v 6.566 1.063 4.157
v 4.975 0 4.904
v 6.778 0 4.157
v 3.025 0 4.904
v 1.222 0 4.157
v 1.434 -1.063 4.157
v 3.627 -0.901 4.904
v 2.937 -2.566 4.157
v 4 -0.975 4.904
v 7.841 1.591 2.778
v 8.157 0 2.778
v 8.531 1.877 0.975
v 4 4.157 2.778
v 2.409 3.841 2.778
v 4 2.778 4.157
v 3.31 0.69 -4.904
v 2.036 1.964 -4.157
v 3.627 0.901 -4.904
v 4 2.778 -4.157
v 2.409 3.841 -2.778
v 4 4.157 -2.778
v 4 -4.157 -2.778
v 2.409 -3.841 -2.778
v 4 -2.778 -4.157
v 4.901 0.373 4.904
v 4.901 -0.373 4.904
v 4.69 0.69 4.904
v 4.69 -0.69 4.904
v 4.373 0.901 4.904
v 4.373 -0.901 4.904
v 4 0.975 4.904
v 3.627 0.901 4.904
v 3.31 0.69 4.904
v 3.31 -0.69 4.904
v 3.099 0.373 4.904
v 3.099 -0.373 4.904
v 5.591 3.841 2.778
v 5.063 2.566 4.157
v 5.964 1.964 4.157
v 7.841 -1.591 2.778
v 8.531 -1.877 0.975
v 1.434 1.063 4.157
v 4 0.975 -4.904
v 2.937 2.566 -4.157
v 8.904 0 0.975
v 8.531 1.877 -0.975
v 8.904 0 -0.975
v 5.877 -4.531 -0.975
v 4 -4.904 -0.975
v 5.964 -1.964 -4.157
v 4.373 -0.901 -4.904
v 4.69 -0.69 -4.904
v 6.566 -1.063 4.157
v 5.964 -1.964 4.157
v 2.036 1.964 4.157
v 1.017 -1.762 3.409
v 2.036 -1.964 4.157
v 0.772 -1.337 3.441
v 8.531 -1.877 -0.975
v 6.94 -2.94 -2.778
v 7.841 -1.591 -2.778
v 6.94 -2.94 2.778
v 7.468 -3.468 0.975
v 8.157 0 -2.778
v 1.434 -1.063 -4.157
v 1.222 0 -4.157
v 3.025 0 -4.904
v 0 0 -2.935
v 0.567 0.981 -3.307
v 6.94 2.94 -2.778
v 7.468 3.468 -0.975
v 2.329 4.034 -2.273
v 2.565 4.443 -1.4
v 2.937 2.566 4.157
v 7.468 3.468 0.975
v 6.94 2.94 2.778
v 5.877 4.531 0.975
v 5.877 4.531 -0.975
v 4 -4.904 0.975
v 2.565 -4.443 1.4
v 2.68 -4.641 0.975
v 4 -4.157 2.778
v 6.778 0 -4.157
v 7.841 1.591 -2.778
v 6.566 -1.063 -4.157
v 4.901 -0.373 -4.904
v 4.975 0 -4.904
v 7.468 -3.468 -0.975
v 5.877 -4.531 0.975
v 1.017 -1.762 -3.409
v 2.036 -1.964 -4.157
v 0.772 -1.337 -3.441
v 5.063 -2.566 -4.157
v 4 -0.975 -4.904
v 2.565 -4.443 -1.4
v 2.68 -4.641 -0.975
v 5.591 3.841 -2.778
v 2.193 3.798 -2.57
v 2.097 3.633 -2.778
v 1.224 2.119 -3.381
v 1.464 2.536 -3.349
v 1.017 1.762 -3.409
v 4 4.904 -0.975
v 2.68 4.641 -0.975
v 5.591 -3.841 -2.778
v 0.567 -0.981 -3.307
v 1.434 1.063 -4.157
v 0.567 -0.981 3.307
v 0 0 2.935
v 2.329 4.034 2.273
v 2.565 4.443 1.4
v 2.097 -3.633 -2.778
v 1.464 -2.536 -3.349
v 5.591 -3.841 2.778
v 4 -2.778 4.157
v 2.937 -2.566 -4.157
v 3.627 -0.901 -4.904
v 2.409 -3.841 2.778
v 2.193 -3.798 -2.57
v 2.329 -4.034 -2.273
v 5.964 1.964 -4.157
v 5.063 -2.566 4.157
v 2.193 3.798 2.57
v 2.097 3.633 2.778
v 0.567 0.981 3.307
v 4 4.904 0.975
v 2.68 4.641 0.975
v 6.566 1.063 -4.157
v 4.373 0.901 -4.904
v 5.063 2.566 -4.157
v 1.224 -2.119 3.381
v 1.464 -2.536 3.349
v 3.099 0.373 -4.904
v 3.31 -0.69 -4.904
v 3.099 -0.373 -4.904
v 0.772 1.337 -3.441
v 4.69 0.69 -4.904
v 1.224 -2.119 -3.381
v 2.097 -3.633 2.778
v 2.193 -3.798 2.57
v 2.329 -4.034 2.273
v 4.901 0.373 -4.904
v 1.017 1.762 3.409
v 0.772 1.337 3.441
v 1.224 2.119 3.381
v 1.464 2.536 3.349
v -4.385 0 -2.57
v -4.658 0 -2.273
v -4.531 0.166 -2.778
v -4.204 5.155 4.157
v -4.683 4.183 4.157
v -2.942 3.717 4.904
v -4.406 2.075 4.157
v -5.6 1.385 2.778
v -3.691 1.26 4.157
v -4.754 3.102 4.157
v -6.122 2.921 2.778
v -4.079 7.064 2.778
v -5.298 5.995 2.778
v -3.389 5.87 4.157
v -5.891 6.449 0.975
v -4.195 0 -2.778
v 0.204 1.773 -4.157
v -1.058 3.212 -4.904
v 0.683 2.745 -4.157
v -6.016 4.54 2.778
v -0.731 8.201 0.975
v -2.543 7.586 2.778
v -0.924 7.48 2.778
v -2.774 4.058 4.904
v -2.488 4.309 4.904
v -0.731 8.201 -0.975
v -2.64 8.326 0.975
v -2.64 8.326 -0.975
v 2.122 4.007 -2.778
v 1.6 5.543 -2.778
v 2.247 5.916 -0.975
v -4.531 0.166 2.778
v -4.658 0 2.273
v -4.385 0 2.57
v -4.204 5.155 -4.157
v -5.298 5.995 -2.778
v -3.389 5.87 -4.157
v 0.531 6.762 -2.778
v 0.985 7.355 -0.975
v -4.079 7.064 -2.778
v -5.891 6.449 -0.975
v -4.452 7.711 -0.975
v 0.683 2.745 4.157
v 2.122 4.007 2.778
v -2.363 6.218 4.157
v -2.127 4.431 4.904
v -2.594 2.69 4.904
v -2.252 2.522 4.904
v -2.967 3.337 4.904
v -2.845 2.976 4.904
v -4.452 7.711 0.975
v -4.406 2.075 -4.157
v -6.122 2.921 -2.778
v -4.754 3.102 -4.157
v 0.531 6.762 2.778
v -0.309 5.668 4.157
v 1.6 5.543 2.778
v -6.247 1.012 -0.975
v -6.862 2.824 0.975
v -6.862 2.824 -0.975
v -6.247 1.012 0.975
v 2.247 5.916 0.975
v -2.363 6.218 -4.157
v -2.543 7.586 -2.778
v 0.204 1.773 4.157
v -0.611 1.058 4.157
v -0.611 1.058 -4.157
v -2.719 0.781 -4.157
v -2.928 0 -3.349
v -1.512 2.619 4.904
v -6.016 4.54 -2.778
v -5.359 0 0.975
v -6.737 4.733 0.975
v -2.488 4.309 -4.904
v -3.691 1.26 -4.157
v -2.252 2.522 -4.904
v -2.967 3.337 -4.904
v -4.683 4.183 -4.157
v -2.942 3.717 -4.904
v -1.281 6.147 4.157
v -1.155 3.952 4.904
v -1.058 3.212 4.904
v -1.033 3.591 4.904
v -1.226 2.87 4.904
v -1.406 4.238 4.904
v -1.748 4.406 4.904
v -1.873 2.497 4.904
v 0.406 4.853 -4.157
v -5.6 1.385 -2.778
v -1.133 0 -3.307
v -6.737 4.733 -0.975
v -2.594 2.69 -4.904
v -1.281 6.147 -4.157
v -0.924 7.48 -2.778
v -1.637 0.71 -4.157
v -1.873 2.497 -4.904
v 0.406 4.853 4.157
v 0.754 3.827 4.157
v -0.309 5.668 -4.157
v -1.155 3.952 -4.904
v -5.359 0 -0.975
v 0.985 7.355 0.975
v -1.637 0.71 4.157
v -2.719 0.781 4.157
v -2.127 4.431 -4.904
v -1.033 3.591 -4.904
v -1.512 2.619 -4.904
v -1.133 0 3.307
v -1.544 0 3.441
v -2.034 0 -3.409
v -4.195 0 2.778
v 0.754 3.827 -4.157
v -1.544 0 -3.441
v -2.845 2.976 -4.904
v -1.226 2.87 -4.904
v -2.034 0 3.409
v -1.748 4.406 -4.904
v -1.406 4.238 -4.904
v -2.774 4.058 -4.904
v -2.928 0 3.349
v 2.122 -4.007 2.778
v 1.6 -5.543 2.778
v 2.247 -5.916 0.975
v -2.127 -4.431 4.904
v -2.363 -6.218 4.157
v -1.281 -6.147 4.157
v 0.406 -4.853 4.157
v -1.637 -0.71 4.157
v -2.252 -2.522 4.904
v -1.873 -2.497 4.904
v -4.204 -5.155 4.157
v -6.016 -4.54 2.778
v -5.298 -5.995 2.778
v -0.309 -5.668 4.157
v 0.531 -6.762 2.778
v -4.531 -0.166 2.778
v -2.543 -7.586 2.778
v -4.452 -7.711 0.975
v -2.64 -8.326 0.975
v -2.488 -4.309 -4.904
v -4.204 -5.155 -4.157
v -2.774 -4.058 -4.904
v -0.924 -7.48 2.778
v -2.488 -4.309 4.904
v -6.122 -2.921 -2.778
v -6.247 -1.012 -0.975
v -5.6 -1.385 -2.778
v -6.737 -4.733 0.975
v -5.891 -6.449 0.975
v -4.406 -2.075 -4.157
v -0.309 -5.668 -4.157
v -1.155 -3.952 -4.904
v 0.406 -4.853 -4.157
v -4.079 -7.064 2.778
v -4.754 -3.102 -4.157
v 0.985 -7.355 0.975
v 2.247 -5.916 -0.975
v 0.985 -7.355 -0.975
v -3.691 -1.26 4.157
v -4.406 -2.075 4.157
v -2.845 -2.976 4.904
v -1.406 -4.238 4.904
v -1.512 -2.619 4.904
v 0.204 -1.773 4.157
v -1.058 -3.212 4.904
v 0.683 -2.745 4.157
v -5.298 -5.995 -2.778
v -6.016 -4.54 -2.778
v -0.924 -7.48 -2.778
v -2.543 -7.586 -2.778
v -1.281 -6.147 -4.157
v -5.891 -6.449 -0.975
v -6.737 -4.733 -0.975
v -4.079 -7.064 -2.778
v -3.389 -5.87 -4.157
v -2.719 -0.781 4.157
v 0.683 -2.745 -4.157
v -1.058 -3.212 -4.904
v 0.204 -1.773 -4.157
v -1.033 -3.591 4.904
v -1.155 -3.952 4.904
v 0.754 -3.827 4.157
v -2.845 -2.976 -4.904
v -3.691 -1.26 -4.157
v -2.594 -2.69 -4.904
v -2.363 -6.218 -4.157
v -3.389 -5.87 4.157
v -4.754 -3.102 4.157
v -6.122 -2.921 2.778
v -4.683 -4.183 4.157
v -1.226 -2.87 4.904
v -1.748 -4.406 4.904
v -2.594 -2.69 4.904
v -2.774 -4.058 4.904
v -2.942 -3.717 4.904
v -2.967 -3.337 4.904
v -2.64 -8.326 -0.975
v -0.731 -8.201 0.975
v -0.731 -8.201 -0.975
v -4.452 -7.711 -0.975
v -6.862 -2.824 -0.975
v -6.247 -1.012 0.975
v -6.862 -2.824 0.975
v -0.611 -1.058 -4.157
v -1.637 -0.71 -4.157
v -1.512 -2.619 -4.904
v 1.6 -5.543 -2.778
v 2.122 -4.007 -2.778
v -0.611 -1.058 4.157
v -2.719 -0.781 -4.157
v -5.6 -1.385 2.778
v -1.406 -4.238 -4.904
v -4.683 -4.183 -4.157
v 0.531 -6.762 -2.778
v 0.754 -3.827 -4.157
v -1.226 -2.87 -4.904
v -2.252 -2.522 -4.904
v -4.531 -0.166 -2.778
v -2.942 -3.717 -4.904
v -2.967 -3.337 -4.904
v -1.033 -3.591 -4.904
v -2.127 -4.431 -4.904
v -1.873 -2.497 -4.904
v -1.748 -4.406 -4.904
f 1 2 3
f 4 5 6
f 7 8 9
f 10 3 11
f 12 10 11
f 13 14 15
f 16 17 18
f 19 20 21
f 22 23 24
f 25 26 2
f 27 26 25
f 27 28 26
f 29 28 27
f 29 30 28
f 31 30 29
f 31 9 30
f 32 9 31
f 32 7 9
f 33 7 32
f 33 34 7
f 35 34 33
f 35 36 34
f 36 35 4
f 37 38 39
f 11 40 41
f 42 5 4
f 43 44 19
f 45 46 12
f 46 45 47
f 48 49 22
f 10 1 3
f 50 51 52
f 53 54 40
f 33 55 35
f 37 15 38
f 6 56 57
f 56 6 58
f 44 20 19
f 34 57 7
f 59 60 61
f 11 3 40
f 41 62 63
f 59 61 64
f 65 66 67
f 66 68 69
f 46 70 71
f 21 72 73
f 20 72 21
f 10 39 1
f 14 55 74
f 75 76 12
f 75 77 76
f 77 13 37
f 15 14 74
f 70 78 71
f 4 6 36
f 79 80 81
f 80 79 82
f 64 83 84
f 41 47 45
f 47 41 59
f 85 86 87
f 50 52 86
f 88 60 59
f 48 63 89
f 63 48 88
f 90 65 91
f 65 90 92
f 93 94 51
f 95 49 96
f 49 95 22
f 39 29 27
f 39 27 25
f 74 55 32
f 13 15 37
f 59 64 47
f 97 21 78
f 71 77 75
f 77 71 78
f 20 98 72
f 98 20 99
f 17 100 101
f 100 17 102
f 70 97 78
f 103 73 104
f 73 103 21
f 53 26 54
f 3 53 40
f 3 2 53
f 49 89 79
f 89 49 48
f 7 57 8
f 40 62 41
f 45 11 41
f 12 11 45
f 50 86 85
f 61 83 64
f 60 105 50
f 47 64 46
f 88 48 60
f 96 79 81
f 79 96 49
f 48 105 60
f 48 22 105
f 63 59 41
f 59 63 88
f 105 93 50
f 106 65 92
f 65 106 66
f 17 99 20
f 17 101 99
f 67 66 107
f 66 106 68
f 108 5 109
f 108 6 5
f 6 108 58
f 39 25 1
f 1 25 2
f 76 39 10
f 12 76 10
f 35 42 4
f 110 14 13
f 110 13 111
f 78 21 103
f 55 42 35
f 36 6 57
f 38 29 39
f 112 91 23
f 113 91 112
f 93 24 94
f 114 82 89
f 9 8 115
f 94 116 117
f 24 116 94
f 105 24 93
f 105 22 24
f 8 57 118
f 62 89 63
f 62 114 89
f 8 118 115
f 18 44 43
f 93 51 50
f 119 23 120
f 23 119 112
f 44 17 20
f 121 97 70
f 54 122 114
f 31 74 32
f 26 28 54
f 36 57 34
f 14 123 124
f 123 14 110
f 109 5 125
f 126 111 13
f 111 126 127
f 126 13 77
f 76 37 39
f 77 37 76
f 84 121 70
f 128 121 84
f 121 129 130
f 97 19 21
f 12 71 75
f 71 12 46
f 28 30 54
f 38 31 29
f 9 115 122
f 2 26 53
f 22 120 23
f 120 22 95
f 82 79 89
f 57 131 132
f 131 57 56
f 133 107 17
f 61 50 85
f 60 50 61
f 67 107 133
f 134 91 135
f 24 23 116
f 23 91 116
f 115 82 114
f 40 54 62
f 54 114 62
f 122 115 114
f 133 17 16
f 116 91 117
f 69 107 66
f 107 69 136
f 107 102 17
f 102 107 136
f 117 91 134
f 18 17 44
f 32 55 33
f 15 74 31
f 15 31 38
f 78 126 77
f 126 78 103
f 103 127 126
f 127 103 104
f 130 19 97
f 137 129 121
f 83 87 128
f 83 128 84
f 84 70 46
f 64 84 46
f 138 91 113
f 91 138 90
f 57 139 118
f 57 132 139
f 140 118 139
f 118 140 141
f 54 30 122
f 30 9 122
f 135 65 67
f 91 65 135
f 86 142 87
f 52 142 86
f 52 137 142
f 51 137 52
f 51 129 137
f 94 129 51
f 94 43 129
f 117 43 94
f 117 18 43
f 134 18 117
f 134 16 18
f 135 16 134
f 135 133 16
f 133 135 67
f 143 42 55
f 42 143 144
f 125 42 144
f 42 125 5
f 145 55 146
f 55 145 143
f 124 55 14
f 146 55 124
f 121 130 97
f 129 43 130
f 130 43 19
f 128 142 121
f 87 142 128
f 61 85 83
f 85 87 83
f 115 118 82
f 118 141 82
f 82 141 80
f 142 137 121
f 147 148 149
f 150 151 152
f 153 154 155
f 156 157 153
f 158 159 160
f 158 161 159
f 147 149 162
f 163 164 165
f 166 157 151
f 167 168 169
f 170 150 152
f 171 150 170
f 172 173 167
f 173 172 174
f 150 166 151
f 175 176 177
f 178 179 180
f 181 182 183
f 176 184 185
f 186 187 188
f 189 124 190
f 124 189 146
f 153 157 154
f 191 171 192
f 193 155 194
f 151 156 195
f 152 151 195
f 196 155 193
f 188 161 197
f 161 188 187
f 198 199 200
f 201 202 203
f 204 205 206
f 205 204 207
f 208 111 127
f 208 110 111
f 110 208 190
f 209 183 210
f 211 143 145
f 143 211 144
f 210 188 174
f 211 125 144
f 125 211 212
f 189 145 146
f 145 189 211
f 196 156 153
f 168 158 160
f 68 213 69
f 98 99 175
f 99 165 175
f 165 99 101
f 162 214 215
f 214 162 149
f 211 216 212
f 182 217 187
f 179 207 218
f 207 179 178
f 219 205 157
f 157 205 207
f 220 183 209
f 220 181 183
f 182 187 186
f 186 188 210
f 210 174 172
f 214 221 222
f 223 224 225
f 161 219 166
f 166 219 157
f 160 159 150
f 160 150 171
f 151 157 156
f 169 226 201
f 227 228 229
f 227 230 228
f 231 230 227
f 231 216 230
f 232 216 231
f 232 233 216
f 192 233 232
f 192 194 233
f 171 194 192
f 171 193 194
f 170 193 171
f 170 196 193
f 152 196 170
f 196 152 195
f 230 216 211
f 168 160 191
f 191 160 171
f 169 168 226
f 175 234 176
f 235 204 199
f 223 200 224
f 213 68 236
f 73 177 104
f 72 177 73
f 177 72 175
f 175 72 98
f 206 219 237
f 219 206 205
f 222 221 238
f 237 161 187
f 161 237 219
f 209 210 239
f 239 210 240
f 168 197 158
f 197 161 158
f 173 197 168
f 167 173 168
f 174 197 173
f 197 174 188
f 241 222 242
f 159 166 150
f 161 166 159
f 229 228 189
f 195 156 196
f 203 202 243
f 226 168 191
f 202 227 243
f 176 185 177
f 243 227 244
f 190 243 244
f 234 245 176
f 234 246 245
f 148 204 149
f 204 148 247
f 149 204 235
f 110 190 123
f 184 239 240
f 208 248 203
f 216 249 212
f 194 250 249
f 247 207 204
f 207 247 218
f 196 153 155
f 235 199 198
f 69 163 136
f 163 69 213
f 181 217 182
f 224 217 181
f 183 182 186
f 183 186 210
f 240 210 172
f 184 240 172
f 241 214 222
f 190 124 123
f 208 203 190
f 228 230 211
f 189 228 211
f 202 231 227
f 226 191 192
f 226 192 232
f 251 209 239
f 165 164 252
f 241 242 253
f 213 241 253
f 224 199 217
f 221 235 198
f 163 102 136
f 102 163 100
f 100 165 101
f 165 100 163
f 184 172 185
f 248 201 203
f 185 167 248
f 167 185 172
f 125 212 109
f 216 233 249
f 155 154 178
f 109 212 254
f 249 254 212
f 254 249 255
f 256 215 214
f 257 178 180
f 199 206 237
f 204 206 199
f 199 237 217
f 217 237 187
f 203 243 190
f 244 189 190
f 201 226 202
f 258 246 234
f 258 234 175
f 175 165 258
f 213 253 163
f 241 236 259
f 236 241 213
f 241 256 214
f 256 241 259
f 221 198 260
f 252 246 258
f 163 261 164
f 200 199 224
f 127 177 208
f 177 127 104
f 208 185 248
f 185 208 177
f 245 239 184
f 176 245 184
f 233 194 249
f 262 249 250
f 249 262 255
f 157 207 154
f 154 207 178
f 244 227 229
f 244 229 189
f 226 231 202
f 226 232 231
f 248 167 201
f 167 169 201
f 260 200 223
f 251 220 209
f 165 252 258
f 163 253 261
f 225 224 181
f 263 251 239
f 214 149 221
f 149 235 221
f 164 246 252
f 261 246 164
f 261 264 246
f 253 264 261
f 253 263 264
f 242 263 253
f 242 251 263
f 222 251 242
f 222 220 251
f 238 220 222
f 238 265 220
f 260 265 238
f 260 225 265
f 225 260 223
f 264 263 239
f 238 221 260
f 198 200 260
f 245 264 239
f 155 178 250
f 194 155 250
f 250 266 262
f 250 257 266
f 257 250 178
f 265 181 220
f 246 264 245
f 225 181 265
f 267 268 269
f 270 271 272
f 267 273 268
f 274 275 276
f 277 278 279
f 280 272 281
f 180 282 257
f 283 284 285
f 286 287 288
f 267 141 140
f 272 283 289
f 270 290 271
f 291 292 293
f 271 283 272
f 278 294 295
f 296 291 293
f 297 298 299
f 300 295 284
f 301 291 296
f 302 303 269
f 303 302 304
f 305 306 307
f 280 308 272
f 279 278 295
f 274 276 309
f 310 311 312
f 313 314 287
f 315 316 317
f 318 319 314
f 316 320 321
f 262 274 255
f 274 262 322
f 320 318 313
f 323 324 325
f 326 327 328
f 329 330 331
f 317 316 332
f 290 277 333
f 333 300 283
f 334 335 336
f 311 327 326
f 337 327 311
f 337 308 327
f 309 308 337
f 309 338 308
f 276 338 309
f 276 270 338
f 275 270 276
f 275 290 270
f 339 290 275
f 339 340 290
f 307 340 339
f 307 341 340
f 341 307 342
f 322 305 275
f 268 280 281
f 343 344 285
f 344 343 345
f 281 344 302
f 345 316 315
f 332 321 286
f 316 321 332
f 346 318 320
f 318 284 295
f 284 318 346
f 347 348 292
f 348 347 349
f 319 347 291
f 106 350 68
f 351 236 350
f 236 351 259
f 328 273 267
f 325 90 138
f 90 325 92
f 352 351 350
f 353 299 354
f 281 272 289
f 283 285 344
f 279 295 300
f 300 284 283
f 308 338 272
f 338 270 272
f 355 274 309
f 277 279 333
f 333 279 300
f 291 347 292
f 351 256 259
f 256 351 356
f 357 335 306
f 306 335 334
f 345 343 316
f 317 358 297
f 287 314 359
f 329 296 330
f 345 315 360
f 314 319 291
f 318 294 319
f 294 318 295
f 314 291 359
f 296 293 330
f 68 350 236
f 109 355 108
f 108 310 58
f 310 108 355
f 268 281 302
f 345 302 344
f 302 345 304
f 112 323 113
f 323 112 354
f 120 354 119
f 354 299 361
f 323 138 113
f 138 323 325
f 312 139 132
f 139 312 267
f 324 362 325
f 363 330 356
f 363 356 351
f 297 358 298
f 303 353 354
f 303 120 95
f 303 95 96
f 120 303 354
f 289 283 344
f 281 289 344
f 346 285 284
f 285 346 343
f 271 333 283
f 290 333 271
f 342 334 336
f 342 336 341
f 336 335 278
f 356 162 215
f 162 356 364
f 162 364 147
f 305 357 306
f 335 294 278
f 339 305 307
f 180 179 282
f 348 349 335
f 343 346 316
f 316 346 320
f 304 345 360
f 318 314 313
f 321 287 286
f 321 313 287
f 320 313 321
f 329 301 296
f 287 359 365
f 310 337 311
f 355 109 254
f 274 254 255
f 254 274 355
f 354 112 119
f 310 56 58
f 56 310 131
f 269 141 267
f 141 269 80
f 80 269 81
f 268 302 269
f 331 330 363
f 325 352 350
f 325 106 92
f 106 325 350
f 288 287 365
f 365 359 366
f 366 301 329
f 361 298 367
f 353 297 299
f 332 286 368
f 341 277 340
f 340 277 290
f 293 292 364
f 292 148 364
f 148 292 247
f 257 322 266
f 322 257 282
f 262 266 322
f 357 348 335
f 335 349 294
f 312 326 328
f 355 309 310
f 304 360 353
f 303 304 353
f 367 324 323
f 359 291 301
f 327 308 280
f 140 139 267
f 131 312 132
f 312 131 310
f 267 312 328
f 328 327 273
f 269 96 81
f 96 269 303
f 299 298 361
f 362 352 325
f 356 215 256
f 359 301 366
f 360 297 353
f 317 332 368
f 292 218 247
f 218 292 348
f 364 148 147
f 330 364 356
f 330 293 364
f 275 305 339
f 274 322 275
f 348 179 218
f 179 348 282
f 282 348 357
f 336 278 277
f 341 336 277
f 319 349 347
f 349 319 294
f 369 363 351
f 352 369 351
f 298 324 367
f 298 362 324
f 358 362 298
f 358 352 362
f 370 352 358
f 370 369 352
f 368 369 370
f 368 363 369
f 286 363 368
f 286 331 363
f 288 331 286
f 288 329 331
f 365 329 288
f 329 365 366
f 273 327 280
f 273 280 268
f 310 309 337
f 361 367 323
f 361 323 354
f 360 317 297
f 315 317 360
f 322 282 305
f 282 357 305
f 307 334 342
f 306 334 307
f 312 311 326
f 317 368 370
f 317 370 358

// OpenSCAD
difference() for (i=[0:2]) rotate(i*360/3) translate([4,0,0]) sphere(5);
